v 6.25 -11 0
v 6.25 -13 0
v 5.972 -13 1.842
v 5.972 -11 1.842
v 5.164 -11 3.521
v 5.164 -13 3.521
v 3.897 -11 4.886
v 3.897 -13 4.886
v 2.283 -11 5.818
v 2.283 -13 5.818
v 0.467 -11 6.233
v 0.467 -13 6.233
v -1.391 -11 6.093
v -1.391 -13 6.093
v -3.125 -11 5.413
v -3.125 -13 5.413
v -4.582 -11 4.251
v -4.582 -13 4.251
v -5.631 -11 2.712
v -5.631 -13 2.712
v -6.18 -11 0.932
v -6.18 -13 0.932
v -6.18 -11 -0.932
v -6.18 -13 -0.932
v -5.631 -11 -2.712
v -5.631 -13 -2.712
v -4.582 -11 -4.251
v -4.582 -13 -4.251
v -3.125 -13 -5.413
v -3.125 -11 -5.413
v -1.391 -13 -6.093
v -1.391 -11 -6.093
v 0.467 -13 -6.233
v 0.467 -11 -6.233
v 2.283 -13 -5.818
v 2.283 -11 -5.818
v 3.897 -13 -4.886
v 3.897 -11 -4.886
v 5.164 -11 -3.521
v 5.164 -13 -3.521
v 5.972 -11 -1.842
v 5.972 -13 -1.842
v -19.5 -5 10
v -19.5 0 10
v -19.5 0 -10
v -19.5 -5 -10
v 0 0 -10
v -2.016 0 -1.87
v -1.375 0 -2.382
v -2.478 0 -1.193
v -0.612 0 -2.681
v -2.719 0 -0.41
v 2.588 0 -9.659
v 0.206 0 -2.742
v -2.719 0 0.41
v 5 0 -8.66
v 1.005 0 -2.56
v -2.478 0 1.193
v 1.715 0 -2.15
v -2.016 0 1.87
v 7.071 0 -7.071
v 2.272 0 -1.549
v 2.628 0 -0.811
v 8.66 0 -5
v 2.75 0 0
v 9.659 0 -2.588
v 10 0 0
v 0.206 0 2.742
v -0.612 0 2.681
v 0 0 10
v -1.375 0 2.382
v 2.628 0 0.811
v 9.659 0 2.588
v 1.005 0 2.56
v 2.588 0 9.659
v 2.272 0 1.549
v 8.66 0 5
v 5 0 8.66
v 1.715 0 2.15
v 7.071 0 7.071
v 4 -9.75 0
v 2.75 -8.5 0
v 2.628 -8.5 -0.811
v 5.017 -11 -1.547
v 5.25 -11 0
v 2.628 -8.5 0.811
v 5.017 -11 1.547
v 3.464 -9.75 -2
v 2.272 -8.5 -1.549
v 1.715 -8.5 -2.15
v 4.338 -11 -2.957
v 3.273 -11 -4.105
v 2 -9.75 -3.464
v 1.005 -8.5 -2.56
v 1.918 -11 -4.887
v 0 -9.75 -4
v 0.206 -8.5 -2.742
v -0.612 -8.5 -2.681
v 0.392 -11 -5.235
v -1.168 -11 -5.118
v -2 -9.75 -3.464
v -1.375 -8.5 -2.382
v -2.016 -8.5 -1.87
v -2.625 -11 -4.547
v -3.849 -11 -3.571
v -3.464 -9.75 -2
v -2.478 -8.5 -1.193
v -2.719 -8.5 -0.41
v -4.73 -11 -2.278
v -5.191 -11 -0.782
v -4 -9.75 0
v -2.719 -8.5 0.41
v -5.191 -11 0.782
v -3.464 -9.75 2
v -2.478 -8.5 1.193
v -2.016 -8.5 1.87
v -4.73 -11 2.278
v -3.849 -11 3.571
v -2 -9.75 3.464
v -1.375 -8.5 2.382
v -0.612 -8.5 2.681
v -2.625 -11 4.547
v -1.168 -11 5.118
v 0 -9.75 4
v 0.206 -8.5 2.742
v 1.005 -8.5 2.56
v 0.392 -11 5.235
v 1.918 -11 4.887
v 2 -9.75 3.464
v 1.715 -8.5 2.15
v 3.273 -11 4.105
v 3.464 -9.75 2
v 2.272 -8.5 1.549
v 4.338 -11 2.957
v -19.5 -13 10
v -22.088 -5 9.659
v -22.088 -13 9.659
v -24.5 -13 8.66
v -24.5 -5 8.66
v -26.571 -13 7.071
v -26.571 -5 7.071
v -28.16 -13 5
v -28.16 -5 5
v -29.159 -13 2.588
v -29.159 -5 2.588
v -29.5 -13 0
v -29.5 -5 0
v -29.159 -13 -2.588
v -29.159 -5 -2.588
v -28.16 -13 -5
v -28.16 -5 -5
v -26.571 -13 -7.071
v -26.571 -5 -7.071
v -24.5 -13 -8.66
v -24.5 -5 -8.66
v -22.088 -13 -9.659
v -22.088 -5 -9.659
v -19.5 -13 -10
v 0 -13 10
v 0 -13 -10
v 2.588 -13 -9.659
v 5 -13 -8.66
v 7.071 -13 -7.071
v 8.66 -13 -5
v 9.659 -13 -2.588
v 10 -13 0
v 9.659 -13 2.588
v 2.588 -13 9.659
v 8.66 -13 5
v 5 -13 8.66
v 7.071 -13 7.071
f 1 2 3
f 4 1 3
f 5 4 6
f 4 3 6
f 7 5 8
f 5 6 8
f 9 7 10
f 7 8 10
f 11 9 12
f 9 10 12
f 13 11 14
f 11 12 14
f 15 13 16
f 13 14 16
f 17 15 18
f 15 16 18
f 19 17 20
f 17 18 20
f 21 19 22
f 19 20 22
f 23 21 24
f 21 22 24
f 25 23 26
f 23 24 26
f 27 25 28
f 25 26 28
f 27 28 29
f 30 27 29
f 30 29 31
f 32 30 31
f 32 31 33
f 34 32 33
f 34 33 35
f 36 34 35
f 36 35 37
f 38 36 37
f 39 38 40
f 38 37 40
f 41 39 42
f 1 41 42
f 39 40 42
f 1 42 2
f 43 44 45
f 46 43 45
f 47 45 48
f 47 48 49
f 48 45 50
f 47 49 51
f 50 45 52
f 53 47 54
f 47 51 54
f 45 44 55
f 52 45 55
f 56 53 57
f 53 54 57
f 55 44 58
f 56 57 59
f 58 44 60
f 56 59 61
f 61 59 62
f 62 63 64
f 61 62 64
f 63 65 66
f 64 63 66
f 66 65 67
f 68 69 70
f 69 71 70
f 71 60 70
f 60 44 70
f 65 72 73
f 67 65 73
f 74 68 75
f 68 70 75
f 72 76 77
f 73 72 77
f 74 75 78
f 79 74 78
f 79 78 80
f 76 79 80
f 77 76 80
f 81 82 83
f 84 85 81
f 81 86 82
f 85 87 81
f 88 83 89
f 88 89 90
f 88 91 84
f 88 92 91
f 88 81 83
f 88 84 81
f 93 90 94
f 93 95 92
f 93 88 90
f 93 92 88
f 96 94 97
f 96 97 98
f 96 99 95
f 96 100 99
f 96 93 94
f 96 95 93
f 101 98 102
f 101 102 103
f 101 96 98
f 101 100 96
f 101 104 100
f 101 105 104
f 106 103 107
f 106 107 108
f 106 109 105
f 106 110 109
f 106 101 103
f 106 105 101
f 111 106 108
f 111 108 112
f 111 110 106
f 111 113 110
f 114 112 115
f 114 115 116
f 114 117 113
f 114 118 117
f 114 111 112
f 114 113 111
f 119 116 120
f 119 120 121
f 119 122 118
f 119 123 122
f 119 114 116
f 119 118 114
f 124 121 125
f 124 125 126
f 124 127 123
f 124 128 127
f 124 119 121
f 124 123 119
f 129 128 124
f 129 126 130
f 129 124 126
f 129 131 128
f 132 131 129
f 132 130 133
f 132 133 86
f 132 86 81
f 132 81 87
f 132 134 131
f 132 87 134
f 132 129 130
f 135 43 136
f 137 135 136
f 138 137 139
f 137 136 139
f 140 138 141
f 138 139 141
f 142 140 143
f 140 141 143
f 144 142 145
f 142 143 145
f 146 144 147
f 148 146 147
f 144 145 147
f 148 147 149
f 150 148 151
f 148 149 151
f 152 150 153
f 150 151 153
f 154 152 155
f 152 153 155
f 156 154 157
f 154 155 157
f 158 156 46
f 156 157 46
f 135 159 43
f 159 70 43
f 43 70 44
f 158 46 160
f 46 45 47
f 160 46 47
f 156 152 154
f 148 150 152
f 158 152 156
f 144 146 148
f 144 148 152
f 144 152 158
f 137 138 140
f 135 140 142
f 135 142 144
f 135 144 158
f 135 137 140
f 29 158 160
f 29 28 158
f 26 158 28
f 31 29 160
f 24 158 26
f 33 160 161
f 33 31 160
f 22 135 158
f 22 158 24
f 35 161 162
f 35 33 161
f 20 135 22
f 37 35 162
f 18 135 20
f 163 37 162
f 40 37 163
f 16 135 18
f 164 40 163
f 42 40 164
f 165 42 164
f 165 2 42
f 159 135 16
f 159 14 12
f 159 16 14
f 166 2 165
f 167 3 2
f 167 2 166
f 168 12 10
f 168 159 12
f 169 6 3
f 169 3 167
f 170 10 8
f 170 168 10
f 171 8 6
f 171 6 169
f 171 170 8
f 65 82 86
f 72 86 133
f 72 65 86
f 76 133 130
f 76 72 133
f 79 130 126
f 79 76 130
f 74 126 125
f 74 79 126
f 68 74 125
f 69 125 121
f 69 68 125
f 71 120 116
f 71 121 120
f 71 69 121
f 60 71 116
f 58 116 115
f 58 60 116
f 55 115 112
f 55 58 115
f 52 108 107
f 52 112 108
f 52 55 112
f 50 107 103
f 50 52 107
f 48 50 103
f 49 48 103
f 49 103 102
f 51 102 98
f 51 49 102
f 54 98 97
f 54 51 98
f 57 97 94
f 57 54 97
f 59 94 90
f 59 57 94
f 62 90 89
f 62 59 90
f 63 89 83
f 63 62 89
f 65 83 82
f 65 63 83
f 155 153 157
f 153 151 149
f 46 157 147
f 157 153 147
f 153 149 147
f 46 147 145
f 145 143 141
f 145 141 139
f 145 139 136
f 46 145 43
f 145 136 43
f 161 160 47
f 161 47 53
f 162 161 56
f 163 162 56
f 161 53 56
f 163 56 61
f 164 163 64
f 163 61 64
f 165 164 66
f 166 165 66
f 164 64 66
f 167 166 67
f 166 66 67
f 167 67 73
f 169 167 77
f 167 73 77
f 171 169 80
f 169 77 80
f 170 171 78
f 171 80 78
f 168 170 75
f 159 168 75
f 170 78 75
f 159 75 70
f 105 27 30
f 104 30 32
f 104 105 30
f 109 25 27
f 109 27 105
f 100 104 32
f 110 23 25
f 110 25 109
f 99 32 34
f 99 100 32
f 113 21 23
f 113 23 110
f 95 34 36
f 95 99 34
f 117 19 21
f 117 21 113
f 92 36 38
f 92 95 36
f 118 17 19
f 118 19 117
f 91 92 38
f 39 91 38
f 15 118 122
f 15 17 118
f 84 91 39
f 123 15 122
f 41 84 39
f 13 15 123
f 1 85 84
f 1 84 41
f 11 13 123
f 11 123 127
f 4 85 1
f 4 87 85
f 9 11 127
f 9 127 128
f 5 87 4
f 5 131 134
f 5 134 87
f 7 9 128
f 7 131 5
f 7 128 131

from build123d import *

# Parameters (mm, degrees)
F0_R     = 2.75
F1_DEPTH = 5
F2_R     = 2.75
F3_DEPTH = 8
F4_R     = 6.25
F5_DEPTH = 2
F6_SIZE  = 2.5


with BuildPart() as f1:
    # F0 (on Front) → F1 (new body)
    with BuildSketch(Plane.XZ):
        with BuildLine():
            ThreePointArc((0, -10), (10, 0), (0, 10))
            Line((0, 10), (-19.5, 10))
            Line((-19.5, 10), (-19.5, -10))
            Line((-19.5, -10), (0, -10))
        make_face()
        Circle(F0_R, mode=Mode.SUBTRACT)
    extrude(amount=F1_DEPTH)

    # F2 (on face) → F3 (join)
    with BuildSketch(Plane.XZ.offset(5)):
        with BuildLine():
            ThreePointArc((0, -10), (10, 0), (0, 10))
            Line((0, 10), (-19.5, 10))
            ThreePointArc((-19.5, 10), (-29.5, 0), (-19.5, -10))
            Line((-19.5, -10), (0, -10))
        make_face()
        Circle(F2_R, mode=Mode.SUBTRACT)
    extrude(amount=F3_DEPTH)

    # F4 (on face) → F5 (cut)
    with BuildSketch(Plane.XZ.offset(13)):
        Circle(F4_R)
    extrude(amount=-F5_DEPTH, mode=Mode.SUBTRACT)

    # F6
    f6_edges = [f1.edges().sort_by_distance(p)[0] for p in [
        (-2.75, -11, 0),
    ]]
    chamfer(f6_edges, length=F6_SIZE)


solid = f1.part
